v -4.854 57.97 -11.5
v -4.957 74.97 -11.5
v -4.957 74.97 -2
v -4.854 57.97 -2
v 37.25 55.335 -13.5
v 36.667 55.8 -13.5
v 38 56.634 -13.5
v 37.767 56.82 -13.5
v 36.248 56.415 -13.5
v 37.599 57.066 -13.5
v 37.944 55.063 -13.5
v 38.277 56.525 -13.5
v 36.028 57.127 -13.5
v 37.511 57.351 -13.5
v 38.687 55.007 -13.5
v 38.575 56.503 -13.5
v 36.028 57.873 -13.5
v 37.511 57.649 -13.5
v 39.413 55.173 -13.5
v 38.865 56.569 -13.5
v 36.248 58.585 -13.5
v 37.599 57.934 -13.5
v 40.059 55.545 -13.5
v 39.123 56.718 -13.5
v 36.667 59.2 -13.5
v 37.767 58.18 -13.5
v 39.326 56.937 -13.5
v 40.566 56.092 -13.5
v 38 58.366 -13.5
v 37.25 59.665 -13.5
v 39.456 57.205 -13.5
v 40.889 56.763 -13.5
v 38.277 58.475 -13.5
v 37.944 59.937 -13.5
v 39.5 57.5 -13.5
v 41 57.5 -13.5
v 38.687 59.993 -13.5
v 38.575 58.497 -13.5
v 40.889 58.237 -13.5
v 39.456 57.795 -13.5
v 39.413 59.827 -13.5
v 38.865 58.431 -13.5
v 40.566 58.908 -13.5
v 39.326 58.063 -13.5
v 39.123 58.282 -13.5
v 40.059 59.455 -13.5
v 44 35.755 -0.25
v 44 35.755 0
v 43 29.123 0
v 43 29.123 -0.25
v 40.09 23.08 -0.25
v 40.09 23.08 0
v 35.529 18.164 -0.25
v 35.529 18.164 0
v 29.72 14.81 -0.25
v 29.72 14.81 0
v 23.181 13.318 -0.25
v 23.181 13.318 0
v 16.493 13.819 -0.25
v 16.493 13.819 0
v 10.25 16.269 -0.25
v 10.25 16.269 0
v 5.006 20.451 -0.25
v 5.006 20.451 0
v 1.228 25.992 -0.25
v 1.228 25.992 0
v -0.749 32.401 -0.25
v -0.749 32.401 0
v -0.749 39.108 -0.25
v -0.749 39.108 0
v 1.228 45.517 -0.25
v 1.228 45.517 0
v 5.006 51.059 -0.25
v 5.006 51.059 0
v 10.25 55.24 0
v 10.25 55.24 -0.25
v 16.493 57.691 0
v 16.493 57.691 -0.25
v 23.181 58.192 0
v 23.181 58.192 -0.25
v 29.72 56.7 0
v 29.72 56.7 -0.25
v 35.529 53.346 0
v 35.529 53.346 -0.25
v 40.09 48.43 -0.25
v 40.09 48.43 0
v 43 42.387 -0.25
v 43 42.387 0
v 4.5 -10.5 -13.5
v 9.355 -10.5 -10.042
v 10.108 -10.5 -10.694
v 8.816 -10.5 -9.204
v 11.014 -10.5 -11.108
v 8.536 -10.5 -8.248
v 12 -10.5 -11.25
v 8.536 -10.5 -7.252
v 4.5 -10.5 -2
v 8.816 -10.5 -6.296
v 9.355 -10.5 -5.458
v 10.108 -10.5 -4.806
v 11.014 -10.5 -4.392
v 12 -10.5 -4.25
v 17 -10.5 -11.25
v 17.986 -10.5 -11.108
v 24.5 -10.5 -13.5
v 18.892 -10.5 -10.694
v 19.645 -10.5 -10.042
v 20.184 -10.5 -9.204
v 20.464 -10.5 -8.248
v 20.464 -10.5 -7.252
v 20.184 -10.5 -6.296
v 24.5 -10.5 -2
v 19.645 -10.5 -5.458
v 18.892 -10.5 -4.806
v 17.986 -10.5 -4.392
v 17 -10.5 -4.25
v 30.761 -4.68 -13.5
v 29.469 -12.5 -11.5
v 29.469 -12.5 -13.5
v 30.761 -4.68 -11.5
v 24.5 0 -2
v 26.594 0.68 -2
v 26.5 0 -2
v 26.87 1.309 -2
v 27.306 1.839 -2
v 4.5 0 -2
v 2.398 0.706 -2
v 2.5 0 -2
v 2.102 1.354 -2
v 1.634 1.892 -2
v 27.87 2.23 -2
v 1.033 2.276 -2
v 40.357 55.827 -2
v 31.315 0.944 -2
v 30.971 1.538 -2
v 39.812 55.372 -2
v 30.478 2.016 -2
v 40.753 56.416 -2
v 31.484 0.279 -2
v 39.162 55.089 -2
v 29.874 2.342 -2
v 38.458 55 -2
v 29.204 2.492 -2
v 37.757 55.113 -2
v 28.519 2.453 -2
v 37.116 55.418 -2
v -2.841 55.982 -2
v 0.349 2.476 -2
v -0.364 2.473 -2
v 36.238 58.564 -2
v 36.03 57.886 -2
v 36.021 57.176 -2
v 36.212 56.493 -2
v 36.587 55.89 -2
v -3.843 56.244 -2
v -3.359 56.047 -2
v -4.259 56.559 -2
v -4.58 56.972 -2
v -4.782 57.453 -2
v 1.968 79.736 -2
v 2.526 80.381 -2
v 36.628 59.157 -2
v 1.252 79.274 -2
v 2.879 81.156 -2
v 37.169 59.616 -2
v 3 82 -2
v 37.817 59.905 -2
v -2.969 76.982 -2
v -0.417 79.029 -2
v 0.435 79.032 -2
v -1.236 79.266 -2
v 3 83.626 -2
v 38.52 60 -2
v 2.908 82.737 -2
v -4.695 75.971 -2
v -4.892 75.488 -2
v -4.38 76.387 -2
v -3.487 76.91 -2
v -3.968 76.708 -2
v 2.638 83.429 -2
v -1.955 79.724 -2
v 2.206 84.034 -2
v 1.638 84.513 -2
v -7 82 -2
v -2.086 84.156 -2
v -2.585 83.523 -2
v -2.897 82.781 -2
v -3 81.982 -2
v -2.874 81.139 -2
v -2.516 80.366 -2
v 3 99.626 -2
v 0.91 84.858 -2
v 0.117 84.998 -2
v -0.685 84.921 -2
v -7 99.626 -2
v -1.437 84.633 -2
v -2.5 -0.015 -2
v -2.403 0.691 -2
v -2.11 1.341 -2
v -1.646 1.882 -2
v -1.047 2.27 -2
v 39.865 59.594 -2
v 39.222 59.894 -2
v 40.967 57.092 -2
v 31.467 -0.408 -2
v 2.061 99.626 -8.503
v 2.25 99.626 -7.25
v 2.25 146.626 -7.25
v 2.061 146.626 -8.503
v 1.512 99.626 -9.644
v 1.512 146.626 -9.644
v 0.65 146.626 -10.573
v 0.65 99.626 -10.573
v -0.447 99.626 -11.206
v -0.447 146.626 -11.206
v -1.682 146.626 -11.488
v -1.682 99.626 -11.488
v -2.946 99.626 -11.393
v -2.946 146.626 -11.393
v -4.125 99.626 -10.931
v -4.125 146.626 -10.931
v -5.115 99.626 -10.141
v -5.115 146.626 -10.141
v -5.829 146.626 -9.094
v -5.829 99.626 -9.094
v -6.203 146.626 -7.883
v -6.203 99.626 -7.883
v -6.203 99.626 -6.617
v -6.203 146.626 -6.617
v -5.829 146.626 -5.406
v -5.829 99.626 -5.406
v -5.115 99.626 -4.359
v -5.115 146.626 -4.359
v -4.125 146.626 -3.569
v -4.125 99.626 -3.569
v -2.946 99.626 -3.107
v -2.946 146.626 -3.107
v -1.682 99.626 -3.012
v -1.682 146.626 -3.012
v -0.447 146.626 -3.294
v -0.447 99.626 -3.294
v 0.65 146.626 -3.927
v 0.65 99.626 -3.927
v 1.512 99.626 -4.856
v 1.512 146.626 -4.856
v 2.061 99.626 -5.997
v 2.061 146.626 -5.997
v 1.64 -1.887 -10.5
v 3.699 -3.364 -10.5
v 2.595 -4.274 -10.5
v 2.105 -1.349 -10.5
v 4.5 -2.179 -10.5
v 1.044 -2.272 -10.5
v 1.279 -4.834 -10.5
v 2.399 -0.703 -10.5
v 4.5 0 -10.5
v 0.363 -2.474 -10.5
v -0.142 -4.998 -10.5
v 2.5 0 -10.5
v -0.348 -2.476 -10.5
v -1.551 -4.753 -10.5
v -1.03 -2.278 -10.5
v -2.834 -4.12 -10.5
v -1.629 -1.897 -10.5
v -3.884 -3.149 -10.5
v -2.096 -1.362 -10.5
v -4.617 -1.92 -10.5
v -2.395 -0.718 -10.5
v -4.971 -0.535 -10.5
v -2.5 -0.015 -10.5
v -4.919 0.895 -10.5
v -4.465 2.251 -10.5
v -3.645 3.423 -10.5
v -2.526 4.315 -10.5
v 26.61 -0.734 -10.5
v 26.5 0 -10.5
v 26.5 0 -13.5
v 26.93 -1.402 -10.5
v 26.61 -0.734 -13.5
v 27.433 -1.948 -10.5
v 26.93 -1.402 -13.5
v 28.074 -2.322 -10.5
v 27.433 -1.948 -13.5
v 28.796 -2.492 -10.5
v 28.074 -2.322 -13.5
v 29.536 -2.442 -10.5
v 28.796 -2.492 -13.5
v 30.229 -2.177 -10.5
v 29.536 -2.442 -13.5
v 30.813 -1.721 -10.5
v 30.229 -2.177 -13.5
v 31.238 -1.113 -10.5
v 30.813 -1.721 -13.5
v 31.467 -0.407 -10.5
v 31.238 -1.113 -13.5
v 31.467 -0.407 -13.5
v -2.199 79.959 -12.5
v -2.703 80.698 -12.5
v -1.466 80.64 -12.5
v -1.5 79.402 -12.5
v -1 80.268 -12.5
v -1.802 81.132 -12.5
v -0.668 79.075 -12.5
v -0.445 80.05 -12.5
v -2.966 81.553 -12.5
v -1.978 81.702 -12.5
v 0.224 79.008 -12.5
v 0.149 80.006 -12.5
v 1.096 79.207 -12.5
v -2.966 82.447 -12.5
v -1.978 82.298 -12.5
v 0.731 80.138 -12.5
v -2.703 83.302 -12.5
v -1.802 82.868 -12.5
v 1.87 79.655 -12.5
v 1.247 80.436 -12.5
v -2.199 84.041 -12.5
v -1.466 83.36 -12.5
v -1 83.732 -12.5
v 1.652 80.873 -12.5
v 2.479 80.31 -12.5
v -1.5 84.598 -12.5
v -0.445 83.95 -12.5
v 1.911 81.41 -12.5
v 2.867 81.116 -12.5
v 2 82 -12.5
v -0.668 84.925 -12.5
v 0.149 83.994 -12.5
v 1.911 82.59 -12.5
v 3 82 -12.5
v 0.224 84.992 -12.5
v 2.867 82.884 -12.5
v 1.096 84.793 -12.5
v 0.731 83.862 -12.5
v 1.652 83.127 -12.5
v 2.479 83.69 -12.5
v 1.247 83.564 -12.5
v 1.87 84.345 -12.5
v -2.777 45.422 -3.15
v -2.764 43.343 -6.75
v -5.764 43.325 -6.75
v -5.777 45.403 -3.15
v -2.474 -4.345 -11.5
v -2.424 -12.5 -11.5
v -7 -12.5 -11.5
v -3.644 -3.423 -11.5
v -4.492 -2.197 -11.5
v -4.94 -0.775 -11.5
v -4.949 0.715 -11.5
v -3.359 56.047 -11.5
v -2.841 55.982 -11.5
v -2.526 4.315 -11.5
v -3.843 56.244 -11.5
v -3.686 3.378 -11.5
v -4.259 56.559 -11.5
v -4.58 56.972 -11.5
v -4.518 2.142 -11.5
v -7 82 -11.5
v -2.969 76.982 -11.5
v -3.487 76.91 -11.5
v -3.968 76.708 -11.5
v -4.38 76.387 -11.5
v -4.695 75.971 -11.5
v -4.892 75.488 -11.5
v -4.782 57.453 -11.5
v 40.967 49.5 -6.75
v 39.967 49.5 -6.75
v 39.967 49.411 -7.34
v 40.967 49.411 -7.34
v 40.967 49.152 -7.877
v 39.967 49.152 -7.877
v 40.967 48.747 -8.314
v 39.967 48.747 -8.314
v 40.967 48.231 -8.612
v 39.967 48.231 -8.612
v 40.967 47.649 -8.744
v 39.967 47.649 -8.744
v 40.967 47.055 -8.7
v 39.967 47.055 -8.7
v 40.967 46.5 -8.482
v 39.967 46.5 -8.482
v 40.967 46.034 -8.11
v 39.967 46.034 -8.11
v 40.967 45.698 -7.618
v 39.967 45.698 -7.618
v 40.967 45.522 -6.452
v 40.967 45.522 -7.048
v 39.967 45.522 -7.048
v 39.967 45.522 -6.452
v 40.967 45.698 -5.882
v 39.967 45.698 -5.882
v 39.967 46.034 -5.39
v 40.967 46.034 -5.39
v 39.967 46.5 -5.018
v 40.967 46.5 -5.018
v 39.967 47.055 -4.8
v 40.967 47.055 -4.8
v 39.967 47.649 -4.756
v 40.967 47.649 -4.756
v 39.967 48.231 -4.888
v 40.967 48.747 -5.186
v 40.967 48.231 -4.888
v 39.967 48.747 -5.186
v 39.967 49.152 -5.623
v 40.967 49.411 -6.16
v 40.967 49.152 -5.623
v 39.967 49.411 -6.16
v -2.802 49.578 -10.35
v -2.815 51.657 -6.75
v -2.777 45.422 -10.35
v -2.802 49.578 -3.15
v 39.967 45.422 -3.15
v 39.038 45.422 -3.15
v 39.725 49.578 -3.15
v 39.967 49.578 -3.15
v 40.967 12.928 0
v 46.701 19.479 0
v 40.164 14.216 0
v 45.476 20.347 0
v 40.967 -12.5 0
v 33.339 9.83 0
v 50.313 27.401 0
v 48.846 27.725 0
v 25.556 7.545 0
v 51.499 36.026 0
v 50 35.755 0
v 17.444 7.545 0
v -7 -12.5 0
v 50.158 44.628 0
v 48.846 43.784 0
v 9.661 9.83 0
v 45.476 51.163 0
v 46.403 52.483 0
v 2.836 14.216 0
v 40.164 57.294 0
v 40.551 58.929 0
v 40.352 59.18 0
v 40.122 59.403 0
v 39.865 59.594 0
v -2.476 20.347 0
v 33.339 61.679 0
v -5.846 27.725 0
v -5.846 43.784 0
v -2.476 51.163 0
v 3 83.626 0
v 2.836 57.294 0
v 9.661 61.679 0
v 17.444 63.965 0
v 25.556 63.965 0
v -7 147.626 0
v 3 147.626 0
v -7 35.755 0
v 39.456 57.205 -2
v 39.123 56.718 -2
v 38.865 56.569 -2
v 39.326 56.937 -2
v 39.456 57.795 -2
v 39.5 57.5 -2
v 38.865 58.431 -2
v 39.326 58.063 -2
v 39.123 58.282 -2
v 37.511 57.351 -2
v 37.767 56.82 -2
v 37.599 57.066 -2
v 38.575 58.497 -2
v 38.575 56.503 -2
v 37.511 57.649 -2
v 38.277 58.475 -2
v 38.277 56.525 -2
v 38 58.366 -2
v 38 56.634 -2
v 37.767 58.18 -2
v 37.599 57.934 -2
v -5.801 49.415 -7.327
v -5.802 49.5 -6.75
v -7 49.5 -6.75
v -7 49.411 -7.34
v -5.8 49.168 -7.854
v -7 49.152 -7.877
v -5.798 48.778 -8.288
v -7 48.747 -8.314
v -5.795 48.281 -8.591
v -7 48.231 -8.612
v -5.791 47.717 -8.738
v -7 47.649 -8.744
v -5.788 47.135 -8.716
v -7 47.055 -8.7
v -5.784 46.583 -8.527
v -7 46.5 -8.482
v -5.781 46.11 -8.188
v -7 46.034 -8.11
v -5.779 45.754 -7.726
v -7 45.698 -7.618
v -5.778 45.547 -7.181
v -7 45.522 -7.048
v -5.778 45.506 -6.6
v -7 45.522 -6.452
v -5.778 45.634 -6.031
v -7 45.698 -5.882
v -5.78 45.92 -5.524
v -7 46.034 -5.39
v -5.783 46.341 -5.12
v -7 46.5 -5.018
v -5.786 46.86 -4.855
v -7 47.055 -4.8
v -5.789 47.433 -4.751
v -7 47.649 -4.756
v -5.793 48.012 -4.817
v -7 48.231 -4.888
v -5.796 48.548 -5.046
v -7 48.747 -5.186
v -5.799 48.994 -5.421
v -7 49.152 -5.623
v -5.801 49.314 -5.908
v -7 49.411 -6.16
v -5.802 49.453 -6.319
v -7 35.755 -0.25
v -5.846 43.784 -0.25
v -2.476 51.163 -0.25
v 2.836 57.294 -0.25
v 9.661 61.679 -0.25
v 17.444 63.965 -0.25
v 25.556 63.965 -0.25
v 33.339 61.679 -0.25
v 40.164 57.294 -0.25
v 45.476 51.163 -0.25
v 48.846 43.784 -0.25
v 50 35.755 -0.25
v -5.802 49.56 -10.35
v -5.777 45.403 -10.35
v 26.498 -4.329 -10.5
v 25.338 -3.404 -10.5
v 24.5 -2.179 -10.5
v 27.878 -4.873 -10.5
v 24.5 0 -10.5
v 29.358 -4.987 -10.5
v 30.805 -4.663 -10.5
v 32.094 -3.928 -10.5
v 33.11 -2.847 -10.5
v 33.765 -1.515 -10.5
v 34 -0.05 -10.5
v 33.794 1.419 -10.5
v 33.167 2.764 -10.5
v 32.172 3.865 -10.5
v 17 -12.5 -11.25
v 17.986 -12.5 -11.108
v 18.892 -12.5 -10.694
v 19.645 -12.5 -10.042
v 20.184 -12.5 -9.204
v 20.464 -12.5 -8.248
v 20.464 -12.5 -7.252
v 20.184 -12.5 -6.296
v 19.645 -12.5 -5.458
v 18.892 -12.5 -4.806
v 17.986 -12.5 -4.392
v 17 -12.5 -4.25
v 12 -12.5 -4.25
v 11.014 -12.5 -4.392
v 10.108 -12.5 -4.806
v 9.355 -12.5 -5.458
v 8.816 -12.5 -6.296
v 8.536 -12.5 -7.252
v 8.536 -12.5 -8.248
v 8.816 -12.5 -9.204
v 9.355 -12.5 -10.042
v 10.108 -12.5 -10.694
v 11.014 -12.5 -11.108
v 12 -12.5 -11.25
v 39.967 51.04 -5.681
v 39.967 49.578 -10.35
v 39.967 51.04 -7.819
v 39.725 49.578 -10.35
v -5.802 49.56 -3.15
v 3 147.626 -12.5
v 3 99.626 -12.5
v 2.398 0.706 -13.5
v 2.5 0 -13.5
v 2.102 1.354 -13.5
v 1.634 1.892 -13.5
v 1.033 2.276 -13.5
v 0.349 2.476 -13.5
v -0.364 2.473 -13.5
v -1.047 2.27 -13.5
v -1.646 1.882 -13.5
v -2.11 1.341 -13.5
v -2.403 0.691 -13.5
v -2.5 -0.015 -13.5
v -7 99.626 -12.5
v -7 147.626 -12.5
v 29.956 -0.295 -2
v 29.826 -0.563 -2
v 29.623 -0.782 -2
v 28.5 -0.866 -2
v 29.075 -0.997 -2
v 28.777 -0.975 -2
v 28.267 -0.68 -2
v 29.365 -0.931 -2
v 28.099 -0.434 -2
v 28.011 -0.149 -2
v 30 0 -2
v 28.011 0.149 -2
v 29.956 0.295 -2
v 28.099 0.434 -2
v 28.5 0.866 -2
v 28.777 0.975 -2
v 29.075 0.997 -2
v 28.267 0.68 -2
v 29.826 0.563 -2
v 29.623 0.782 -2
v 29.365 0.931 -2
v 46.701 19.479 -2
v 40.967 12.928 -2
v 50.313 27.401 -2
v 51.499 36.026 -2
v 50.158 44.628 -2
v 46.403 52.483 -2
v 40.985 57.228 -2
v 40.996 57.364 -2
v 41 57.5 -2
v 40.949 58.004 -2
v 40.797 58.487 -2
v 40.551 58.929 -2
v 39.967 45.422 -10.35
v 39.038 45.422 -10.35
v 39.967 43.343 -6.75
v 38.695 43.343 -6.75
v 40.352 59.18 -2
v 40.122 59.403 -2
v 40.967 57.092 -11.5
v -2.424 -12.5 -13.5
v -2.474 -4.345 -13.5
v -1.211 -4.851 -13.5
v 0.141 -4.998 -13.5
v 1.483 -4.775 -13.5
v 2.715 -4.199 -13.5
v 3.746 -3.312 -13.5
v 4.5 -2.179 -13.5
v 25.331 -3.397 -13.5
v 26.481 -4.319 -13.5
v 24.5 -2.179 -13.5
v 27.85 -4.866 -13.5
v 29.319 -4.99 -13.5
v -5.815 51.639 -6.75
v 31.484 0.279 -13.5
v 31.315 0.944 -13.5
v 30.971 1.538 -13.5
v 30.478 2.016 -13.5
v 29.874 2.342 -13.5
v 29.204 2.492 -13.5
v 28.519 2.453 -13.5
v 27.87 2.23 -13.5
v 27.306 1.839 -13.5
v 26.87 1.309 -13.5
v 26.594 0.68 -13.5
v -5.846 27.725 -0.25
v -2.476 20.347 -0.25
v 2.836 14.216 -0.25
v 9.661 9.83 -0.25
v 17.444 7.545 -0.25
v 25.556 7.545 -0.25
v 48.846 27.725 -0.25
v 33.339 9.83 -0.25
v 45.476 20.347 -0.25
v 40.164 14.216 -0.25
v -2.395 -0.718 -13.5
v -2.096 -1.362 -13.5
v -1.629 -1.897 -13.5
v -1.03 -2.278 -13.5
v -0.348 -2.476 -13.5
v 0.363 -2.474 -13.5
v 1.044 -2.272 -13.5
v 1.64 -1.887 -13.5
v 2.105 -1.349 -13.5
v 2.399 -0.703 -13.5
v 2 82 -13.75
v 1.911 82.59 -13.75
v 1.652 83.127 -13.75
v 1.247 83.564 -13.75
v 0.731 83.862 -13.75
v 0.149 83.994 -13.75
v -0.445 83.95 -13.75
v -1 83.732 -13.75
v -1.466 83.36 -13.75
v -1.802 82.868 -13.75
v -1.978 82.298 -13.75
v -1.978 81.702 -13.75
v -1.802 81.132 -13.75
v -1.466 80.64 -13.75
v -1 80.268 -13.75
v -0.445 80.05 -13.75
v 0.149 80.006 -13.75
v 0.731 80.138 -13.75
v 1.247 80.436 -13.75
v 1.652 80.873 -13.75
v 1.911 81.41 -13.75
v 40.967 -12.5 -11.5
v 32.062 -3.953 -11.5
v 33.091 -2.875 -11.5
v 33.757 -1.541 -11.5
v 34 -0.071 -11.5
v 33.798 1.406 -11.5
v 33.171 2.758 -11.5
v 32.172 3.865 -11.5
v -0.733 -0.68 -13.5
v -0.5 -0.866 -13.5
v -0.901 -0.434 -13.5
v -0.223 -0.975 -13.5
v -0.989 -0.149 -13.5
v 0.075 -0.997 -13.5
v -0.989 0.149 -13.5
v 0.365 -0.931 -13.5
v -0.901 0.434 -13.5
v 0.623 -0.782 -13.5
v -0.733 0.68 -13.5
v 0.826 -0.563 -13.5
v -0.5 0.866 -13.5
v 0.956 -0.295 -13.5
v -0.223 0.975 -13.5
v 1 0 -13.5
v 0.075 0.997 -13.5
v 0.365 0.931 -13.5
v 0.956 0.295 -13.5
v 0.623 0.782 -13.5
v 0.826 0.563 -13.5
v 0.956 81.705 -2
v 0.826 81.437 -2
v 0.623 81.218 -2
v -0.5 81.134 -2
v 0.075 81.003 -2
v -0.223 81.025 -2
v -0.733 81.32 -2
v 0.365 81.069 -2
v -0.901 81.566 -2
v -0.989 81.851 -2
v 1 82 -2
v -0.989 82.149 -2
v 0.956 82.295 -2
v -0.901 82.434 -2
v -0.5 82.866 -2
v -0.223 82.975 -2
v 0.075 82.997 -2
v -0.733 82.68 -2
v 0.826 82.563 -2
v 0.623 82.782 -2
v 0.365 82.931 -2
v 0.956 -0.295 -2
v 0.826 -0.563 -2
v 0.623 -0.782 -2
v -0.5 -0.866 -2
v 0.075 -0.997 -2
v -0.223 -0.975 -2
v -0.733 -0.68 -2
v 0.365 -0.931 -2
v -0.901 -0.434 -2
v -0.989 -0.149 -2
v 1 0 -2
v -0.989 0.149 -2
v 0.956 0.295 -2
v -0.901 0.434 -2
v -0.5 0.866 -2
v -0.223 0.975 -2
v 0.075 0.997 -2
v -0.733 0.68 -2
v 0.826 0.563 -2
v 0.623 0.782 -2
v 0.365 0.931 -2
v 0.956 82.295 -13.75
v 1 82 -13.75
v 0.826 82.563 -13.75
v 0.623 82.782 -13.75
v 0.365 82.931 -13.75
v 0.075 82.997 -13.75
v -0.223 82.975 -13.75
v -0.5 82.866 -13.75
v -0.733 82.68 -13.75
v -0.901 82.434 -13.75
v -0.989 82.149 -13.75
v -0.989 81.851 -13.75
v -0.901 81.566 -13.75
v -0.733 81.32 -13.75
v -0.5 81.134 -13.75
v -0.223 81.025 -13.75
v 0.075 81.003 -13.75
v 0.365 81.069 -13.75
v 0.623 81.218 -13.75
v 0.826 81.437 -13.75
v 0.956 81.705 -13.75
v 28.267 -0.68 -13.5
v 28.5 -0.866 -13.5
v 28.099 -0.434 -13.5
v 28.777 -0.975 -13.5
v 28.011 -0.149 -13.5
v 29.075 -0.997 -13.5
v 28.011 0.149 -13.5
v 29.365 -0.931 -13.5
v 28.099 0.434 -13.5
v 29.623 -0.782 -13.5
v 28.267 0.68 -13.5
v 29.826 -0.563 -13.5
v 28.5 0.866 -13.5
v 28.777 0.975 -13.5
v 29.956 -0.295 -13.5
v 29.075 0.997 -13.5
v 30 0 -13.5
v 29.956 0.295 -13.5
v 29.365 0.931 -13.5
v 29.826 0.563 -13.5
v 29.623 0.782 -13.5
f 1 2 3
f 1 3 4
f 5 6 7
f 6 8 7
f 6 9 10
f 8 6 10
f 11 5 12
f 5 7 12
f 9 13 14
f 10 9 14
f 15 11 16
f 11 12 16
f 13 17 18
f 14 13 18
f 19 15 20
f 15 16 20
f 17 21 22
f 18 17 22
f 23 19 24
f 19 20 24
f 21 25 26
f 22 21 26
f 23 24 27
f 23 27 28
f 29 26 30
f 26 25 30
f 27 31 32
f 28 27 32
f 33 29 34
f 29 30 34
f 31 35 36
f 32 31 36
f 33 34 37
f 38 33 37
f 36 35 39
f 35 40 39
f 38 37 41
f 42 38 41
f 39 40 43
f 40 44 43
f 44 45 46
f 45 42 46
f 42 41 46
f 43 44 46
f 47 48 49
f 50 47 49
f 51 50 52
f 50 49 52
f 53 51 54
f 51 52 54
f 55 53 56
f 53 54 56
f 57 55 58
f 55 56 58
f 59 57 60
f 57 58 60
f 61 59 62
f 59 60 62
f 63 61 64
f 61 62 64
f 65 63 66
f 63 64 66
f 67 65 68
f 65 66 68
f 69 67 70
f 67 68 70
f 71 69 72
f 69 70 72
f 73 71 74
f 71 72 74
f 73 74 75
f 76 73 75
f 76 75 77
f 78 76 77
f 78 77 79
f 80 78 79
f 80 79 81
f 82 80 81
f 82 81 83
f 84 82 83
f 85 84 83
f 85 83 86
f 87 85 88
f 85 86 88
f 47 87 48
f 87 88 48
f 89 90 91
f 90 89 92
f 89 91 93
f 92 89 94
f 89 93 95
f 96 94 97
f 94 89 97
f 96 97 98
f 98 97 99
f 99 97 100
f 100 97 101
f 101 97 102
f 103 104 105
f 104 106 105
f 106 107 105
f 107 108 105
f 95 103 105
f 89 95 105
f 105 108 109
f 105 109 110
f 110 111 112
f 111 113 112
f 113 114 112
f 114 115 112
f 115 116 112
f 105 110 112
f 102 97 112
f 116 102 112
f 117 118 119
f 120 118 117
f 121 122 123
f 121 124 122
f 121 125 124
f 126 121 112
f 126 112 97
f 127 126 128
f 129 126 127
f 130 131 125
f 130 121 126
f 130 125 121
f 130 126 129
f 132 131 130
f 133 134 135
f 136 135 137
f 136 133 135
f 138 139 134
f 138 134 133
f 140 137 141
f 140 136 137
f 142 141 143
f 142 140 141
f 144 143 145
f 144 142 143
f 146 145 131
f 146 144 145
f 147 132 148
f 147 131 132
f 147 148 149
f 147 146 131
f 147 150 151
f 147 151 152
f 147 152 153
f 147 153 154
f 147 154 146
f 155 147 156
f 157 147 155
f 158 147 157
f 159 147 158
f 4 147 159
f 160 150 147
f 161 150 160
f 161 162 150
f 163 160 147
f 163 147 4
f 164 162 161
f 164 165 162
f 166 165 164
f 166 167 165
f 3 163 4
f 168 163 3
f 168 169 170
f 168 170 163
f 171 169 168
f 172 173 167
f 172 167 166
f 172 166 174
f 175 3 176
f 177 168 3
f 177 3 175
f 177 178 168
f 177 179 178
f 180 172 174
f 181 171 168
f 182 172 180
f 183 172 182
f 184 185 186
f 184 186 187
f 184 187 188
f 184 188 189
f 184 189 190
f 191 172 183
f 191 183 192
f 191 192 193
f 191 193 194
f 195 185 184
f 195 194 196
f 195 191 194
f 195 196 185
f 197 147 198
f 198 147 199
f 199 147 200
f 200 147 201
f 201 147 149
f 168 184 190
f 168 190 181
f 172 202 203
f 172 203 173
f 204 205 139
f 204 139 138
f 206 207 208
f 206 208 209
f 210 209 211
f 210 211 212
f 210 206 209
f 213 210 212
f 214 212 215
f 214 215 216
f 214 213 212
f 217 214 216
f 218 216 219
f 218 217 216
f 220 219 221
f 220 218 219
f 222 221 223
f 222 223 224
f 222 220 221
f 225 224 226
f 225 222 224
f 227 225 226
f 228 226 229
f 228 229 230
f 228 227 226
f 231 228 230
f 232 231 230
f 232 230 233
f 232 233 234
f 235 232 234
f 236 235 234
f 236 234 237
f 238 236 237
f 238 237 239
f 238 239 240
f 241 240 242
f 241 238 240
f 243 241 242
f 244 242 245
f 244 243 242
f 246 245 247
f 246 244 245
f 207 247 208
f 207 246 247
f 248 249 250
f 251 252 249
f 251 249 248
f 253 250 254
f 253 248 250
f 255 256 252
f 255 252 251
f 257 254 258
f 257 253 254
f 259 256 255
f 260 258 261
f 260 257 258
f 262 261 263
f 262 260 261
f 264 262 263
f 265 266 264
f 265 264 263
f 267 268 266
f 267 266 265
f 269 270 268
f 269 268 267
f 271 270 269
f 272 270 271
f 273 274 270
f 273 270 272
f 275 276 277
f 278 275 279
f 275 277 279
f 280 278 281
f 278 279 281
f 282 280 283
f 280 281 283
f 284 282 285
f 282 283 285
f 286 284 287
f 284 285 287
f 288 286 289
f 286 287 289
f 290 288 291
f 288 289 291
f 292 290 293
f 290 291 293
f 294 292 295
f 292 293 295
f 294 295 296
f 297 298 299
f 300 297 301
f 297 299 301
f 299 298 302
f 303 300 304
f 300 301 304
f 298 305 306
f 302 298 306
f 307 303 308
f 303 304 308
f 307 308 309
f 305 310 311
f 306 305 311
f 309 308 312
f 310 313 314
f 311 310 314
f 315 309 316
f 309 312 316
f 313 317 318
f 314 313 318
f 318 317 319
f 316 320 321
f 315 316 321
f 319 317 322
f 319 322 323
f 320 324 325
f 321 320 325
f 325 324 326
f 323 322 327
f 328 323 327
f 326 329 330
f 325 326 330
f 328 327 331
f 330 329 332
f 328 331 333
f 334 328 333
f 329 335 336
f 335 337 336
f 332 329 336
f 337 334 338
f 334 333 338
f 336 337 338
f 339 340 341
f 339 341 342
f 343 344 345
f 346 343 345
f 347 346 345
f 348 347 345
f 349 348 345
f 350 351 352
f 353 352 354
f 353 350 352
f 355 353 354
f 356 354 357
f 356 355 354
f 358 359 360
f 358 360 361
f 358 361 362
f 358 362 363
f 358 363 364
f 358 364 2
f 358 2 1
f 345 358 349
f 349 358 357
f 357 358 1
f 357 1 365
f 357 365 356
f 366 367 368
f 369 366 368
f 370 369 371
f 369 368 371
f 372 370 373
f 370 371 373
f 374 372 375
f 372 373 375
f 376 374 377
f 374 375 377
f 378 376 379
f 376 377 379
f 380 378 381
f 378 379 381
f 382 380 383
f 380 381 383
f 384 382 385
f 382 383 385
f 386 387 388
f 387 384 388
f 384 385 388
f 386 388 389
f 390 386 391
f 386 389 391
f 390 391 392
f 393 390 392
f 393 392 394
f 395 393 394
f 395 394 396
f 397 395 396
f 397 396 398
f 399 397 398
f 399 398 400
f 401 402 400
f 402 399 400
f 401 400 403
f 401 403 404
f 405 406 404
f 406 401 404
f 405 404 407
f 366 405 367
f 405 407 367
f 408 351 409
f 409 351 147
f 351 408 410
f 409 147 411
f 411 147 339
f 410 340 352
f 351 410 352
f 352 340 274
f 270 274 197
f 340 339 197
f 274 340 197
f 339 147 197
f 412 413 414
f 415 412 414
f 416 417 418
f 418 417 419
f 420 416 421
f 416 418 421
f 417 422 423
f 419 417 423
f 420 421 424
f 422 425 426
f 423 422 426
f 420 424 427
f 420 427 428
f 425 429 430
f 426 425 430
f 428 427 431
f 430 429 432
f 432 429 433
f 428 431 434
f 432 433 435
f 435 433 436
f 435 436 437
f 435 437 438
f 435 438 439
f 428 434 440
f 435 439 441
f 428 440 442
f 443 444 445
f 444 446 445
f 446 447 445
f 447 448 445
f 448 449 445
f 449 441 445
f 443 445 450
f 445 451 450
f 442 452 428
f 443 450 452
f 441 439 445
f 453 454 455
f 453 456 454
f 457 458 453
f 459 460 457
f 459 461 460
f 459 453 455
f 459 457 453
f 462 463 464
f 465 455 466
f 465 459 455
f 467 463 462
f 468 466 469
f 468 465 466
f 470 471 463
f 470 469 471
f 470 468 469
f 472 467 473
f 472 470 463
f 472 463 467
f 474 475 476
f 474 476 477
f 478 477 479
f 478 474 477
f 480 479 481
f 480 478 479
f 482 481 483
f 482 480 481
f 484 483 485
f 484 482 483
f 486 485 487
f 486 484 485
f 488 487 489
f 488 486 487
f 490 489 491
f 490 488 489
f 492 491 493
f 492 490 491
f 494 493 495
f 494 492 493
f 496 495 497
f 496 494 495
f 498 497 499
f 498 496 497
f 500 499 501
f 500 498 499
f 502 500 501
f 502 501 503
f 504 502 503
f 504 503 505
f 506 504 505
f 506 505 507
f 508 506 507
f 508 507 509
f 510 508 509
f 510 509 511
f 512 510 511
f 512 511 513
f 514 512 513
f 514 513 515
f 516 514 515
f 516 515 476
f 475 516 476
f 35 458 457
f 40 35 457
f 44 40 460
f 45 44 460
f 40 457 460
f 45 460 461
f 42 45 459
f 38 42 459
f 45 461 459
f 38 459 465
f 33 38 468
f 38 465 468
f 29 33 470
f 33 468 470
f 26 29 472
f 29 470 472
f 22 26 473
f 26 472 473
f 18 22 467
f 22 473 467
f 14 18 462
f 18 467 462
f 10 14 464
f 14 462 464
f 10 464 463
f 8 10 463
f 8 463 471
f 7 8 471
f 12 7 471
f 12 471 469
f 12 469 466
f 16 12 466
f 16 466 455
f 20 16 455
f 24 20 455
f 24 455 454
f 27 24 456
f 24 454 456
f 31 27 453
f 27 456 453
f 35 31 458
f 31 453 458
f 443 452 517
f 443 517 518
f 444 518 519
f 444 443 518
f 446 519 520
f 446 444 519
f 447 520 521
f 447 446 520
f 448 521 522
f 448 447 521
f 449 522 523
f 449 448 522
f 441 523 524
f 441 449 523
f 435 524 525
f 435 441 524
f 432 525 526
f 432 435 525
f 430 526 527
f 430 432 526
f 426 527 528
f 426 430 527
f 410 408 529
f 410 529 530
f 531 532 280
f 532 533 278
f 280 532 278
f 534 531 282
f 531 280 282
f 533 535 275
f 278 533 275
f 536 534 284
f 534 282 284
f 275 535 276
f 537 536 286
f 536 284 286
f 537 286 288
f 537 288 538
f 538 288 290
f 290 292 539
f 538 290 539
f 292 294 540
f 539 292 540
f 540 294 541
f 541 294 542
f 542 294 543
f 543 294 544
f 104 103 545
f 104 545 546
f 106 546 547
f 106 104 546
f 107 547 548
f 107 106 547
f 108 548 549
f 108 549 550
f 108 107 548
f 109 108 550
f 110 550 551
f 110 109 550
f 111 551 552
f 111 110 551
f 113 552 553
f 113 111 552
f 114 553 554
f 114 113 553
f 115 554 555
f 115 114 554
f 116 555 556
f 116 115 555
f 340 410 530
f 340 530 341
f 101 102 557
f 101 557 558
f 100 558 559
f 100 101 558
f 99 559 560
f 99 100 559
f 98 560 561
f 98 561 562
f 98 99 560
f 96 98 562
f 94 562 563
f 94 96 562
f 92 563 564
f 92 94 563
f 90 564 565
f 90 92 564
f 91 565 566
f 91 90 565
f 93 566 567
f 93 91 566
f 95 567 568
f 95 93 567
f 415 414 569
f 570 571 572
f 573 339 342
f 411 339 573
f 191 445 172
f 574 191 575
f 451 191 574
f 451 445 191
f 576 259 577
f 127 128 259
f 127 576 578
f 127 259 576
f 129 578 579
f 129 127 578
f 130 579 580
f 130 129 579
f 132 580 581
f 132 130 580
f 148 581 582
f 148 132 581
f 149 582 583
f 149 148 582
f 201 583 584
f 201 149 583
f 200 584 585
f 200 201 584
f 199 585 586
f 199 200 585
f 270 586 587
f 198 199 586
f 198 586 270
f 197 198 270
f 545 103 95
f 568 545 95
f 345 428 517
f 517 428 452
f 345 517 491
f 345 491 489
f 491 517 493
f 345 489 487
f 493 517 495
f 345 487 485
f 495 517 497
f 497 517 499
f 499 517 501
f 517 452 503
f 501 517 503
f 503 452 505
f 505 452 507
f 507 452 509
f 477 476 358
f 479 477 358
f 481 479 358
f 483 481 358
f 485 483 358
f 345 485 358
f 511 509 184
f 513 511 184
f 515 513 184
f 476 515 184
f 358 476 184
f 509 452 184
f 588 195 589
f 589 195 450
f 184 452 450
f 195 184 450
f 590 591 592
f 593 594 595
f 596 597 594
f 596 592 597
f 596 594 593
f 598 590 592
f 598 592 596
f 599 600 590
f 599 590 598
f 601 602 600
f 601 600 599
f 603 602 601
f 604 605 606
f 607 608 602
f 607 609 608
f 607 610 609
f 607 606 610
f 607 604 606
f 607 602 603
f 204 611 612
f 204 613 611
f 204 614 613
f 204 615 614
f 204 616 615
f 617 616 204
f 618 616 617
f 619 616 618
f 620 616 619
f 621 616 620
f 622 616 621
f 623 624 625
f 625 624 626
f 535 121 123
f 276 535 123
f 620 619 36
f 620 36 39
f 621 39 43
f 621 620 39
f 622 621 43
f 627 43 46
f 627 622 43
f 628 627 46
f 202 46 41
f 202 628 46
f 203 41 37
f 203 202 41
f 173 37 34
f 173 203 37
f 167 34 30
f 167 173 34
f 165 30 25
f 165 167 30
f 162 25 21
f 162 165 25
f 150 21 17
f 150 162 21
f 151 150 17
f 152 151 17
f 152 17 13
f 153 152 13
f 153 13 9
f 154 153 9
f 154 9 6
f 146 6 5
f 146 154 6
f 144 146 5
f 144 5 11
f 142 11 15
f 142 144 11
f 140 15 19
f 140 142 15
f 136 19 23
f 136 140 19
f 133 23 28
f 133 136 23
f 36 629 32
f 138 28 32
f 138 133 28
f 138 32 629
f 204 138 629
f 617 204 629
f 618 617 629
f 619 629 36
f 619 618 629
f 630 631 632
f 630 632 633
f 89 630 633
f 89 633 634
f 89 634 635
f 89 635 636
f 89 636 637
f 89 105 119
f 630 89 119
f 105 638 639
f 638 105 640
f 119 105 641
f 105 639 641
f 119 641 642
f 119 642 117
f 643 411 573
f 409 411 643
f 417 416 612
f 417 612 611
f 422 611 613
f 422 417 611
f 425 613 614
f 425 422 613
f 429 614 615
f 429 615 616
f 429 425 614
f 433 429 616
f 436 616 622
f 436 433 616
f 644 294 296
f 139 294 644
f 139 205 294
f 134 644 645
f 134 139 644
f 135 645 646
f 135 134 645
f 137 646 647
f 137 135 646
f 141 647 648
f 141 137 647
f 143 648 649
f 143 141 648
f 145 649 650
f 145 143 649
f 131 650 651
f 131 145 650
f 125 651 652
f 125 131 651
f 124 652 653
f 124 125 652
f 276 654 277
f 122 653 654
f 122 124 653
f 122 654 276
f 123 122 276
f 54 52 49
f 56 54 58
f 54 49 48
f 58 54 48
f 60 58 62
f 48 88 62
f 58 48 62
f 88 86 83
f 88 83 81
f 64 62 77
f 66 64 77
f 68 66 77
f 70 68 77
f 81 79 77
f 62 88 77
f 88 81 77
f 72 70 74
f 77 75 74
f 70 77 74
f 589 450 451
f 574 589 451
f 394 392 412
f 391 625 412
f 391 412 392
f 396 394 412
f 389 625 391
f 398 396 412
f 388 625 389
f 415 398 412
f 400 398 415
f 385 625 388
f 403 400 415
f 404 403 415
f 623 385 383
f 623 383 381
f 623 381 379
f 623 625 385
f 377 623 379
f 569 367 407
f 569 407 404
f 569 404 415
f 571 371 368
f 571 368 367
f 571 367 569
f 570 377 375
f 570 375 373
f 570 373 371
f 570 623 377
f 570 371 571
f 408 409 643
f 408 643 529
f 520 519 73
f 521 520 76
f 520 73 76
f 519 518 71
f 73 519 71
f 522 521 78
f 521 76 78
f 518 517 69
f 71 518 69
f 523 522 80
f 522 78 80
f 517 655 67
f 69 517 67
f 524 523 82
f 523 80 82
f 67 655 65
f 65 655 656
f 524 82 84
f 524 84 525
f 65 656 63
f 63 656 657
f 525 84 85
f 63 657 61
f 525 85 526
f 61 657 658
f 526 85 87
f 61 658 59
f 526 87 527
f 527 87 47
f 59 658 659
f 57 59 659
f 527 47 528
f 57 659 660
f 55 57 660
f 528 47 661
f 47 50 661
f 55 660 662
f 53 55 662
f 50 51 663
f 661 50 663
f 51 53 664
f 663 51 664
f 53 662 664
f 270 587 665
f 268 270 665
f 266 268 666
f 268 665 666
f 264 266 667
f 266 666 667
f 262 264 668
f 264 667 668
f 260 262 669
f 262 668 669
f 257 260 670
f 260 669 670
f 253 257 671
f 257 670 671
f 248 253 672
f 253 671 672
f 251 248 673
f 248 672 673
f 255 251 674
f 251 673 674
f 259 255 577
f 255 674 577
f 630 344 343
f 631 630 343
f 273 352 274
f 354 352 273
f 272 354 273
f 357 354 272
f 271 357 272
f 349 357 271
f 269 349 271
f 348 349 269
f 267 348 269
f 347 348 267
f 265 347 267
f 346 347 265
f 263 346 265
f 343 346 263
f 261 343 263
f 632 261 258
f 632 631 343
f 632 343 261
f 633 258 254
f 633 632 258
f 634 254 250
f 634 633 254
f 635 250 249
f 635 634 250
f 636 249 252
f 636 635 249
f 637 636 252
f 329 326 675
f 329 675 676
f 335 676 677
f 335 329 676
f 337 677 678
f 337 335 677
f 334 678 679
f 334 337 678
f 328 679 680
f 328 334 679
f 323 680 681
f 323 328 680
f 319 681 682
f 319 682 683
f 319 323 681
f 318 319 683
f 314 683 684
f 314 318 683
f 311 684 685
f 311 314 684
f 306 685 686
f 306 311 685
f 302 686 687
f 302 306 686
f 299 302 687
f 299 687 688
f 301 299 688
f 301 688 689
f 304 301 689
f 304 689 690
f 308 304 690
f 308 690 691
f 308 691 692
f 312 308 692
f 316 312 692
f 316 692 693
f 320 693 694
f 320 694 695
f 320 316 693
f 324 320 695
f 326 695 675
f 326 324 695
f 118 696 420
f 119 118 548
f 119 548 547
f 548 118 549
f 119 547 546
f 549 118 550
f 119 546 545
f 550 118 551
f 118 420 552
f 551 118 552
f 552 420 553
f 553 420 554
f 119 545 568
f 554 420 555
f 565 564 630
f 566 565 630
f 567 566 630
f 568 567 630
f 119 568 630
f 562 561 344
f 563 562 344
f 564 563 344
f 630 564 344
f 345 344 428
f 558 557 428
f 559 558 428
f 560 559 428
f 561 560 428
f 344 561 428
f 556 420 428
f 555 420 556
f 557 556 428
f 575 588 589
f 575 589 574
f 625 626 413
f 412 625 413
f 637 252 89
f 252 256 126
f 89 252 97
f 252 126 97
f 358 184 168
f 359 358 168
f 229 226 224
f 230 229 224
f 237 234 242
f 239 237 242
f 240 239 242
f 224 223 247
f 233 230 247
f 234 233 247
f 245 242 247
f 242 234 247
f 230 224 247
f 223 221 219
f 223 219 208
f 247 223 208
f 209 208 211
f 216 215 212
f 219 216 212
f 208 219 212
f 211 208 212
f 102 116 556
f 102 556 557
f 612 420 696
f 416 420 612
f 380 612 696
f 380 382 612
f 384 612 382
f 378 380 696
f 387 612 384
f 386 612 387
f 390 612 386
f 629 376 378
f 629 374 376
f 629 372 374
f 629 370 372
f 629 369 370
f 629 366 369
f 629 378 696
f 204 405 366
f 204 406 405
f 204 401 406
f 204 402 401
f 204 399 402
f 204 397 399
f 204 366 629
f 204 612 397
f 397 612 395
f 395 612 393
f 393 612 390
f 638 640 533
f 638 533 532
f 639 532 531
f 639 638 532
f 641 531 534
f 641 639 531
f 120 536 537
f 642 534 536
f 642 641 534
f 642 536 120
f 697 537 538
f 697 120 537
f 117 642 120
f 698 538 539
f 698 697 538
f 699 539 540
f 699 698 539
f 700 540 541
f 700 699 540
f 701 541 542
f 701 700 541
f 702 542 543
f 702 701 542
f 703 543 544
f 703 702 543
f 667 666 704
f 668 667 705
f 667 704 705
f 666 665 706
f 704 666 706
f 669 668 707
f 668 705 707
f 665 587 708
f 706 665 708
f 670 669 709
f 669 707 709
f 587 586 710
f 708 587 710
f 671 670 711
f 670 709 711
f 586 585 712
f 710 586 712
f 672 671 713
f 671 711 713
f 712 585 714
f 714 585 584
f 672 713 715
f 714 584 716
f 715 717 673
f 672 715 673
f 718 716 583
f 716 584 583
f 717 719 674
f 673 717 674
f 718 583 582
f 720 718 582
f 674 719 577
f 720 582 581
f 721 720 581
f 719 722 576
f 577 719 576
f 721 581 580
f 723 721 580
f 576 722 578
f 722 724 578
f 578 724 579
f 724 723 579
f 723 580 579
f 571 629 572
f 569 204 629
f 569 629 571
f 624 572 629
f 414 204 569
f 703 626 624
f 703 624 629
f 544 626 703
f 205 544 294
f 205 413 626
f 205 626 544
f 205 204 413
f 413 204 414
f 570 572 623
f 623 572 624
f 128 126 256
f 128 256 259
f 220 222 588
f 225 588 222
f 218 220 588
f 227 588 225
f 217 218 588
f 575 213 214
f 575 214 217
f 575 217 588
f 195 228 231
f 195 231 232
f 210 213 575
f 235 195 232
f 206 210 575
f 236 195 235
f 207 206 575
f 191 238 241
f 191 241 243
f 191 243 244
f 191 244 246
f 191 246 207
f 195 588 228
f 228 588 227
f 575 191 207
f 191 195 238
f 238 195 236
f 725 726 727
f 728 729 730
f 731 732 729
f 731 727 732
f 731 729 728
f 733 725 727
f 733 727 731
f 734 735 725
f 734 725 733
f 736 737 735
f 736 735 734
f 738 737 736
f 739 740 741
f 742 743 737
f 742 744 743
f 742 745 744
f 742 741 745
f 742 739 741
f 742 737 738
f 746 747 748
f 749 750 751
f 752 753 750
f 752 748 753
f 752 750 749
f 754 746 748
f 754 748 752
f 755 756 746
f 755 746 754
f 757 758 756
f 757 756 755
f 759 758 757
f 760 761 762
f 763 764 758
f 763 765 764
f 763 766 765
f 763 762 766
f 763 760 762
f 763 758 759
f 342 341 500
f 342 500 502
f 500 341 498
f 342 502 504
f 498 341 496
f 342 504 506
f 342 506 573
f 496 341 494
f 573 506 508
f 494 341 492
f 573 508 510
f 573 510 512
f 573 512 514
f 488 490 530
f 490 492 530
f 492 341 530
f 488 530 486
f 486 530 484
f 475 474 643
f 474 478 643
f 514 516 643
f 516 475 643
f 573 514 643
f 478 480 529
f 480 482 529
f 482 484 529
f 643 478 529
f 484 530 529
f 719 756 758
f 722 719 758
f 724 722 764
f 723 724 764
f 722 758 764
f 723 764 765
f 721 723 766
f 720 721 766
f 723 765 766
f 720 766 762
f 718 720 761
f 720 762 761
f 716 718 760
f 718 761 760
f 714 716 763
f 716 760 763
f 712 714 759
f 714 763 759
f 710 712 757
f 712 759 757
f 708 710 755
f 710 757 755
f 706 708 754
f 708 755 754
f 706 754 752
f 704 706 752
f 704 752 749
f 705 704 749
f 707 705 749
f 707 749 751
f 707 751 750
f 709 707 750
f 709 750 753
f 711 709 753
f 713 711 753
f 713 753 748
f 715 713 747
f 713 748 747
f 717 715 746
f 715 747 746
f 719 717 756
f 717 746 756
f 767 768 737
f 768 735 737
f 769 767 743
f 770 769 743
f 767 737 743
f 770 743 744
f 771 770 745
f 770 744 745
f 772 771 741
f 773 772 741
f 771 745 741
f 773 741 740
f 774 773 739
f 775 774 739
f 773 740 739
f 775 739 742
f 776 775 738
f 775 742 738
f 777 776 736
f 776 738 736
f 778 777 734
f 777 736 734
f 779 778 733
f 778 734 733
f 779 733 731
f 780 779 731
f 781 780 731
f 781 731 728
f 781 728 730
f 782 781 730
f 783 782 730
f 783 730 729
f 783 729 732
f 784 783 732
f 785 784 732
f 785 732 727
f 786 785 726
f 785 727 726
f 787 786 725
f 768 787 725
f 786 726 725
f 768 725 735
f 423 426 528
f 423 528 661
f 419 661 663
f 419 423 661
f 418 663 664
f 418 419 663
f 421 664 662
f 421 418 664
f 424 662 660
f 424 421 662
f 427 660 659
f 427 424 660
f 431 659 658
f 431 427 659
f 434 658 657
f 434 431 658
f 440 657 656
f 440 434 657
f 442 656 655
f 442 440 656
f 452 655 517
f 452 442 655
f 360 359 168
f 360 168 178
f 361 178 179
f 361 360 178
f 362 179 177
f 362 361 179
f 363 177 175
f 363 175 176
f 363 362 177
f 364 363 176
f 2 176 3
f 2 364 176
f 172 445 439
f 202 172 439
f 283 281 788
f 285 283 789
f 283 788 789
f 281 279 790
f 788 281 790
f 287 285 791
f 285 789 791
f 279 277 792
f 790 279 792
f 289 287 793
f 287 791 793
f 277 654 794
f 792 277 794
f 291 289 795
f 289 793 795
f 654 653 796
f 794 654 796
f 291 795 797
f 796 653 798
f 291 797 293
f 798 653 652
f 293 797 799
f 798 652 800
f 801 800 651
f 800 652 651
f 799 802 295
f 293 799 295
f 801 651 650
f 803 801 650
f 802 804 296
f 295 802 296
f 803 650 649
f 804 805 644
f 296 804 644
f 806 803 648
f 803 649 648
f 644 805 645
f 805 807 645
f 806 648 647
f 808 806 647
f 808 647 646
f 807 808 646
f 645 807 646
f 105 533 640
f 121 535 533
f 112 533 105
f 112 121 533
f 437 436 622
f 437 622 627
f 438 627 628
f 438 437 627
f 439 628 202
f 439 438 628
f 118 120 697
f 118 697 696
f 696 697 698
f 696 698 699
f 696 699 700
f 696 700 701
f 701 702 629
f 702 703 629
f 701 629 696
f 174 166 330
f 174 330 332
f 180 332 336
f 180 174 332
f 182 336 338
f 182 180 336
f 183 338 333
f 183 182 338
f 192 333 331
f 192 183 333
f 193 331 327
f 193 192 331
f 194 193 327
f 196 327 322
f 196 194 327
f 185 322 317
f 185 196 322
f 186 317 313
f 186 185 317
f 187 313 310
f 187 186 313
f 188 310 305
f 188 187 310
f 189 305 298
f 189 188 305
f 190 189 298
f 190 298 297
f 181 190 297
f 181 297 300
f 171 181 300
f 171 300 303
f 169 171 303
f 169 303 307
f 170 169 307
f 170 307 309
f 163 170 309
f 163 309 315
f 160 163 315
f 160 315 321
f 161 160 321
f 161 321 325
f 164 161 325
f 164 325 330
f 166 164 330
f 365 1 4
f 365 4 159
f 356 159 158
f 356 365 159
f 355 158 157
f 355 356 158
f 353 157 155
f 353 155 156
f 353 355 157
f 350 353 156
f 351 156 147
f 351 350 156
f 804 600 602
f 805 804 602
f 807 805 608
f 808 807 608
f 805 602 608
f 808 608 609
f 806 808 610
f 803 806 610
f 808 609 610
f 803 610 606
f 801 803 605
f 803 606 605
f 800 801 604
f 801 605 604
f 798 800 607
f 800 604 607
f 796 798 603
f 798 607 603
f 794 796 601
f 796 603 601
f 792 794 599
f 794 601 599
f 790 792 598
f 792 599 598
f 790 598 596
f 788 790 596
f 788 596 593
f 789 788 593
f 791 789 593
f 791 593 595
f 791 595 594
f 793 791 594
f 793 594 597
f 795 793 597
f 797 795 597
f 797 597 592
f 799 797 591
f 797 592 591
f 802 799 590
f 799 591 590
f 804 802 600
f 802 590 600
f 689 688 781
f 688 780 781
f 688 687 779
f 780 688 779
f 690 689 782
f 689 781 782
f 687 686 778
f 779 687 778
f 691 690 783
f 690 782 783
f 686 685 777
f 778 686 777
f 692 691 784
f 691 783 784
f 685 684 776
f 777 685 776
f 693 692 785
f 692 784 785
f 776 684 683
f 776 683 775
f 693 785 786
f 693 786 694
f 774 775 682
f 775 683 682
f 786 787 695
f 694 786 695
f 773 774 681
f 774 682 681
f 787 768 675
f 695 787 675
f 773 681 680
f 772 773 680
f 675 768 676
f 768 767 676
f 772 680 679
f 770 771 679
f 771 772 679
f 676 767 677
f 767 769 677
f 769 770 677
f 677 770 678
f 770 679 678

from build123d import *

# Parameters (mm, degrees)
PAD_DEPTH            = 2
SKETCH001_R          = 2.5
SKETCH001_R_2        = 1
PAD003_DEPTH         = 11.5
SKETCH003_R          = 3
SKETCH003_R_2        = 1
PAD004_DEPTH         = 10.5
SKETCH006_R          = 2
SKETCH006_R_2        = 1
PAD007_DEPTH         = 1.25
PAD010_DEPTH         = 2
SKETCH008_W          = 10
SKETCH008_H          = 48
PAD009_DEPTH         = 10.5
SKETCH009_R          = 4.25
POCKET_DEPTH         = 47
PAD011_DEPTH         = 11.5
POCKET001_DEPTH      = 2
PAD012_DEPTH         = 11.5
POCKET002_DEPTH      = 2
SKETCH017_R          = 2
POCKET003_DEPTH      = 100
POCKET003_DEPTH_BACK = 100
POCKET004_DEPTH      = 3
POCKET005_DEPTH      = 3
POCKET006_DEPTH      = 9.5
PAD013_DEPTH         = 2
SKETCH023_R          = 28.5
SKETCH023_R_2        = 22.5
POCKET007_DEPTH      = 0.25


with BuildPart() as body:
    # Sketch → Pad (new body)
    with BuildSketch(Plane.XY):
        with BuildLine():
            Line((1.6382610688, 84.5131853633), (39.8652231068, 59.5943175186))
            ThreePointArc((40.9665622412, 57.0924822575), (40.788108314, 58.5072538624), (39.8652231068, 59.5943175186))
            Line((31.4665652521, -0.4074995185), (40.9665622412, 57.0924822575))
            Line((31.4665652521, -0.4074995185), (29.4686738682, -12.5))
            Line((-2.4238255474, -12.5), (29.4686738682, -12.5))
            Line((-2.999944227, 81.9817069741), (-2.4238255474, -12.5))
            ThreePointArc((1.6382610688, 84.5131853633), (-1.4372337891, 84.6333171164), (-2.999944227, 81.9817069741))
        make_face()
    extrude(amount=PAD_DEPTH)

    # Sketch001 (on Face9 of Pad) → Pad003 (join)
    with BuildSketch(Plane.XY.offset(2)):
        Circle(SKETCH001_R)
        Circle(SKETCH001_R_2, mode=Mode.SUBTRACT)
        with Locations((29, 0)):
            Circle(SKETCH001_R)
        with Locations((29, 0)):
            Circle(SKETCH001_R_2, mode=Mode.SUBTRACT)
        with Locations((38.5, 57.5)):
            Circle(SKETCH001_R)
        with Locations((38.5, 57.5)):
            Circle(SKETCH001_R_2, mode=Mode.SUBTRACT)
    extrude(amount=PAD003_DEPTH)

    # Sketch003 (on Face5 of Pad003) → Pad004 (join)
    with BuildSketch(Plane.XY.offset(2)):
        with Locations((0, 82)):
            Circle(SKETCH003_R)
        with Locations((0, 82)):
            Circle(SKETCH003_R_2, mode=Mode.SUBTRACT)
    extrude(amount=PAD004_DEPTH)

    # Sketch006 (on Face11 of Pad004) → Pad007 (join)
    with BuildSketch(Plane.XY.offset(12.5)):
        with Locations((0, 82)):
            Circle(SKETCH006_R)
        with Locations((0, 82)):
            Circle(SKETCH006_R_2, mode=Mode.SUBTRACT)
    extrude(amount=PAD007_DEPTH)

    # Sketch011 → Pad010 (join)
    with BuildSketch(Plane.XY):
        with BuildLine():
            Line((-7, 147.625513661), (3, 147.625513661))
            Line((3, 147.625513661), (3, 83.625513661))
            Line((1.6382610688, 84.5131853633), (3, 83.625513661))
            ThreePointArc((1.6382610688, 84.5131853633), (-1.4372359533, 84.6333159352), (-2.9999441969, 81.9817020431))
            Line((-2.9999441969, 81.9817020431), (-2.9694558253, 76.9817020431))
            Line((-7, 82), (-2.9694558253, 76.9817020431))
            Line((-7, 147.625513661), (-7, 82))
        make_face()
    extrude(amount=PAD010_DEPTH)

    # Sketch008 (on Face13 of Pad010) → Pad009 (join)
    with BuildSketch(Plane.XY.offset(2)):
        with Locations((-2, 123.625513661)):
            Rectangle(SKETCH008_W, SKETCH008_H)
    extrude(amount=PAD009_DEPTH)

    # Sketch009 (on Face22 of Pad009) → Pocket (cut)
    with BuildSketch(Plane.XZ.offset(-99.625513661)):
        with Locations((-2, 7.25)):
            Circle(SKETCH009_R)
    extrude(amount=-POCKET_DEPTH, mode=Mode.SUBTRACT)

    # Sketch012 (on Face4 of Pocket) → Pad011 (join)
    with BuildSketch(Plane.XY.offset(2)):
        with BuildLine():
            Line((4.5, 0), (2.5, 0))
            ThreePointArc((-2.4999535249, -0.0152438001), (0.0076219355, -2.4999883812), (2.5, 0))
            Line((-2.4238255474, -12.5), (-2.4999535249, -0.0152438001))
            Line((-2.4238255474, -12.5), (29.4686738682, -12.5))
            Line((29.4686738682, -12.5), (31.4665652521, -0.4074995185))
            ThreePointArc((26.4999999999, 0), (28.7955655729, -2.4916272926), (31.4665652521, -0.4074995185))
            Line((24.5, 0), (26.4999999999, 0))
            Line((24.5, 0), (24.5, -10.5))
            Line((4.5, -10.5), (24.5, -10.5))
            Line((4.5, 0), (4.5, -10.5))
        make_face()
    extrude(amount=PAD011_DEPTH)

    # Sketch013 (on Face16 of Pad011) → Pocket001 (cut)
    with BuildSketch(Plane(origin=(0, -10.5, 0), x_dir=(-1, 0, 0), z_dir=(0, 1, 0))):
        with BuildLine():
            ThreePointArc((-17, 11.25), (-20.5, 7.75), (-17, 4.25))
            Line((-17, 4.25), (-12, 4.25))
            ThreePointArc((-12, 4.25), (-8.5, 7.75), (-12, 11.25))
            Line((-17, 11.25), (-12, 11.25))
        make_face()
    extrude(amount=-POCKET001_DEPTH, mode=Mode.SUBTRACT)

    # Sketch014 → Pad012 (join)
    with BuildSketch(Plane.XY):
        Polygon((-7, 82), (-2.9694558253, 76.9817020431), (-2.4238255474, -12.5), (-7, -12.5), align=None)
        Polygon((40.9665622412, 57.0924822575), (29.4686738682, -12.5), (40.9665622412, -12.5), align=None)
    extrude(amount=PAD012_DEPTH)

    # Sketch016 (on DatumPlane) → Pocket002 (cut)
    with BuildSketch(Plane.YZ.offset(37.9665622412)):
        Polygon((51.6569219382, 6.75), (49.5784609691, 10.35), (45.4215390309, 10.35), (43.3430780618, 6.75), (45.4215390309, 3.15), (49.5784609691, 3.15), align=None)
    extrude(amount=POCKET002_DEPTH, mode=Mode.SUBTRACT)

    # Sketch017 (on DatumPlane) → Pocket003 (cut, two sides)
    with BuildSketch(Plane.YZ.offset(37.9665622412)) as pocket003_sk:
        with Locations((47.5, 6.75)):
            Circle(SKETCH017_R)
    extrude(amount=-POCKET003_DEPTH, mode=Mode.SUBTRACT)
    extrude(pocket003_sk.sketch, amount=POCKET003_DEPTH_BACK, mode=Mode.SUBTRACT)

    # Sketch018 (on Face13 of Pocket003) → Pocket004 (cut)
    with BuildSketch(Plane(origin=(-2.4999535243, -0.0152439024, 0), x_dir=(-0.006097561, 0.9999814097, 0), z_dir=(0.9999814097, 0.006097561, 0))):
        Polygon((51.6730491796, 6.75), (49.5945882105, 10.35), (45.4376662723, 10.35), (43.3592053032, 6.75), (45.4376662723, 3.15), (49.5945882105, 3.15), align=None)
    extrude(amount=-POCKET004_DEPTH, mode=Mode.SUBTRACT)

    # Sketch019 (on Face45 of Pocket004) → Pocket005 (cut)
    with BuildSketch(Plane.XY.offset(13.5)):
        with BuildLine():
            ThreePointArc((-2.4999535248, -0.0152438096), (0.0076219402, -2.4999883812), (2.5, 0))
            Line((2.5, 0), (4.5, 0))
            Line((4.5, 0), (4.5, -2.1794494718))
            ThreePointArc((-2.5263567378, 4.3148026181), (-3.3937655316, -3.671832719), (4.5, -2.1794494718))
            Line((-2.5263567378, 4.3148026181), (-2.4999535248, -0.0152438096))
        make_face()
        with BuildLine():
            ThreePointArc((24.5, -2.1794494718), (32.0941134062, -3.9276535272), (32.172405562, 3.8646918312))
            Line((31.4665660971, -0.4074944038), (32.172405562, 3.8646918312))
            ThreePointArc((26.4999999999, 0), (28.7955681562, -2.4916275046), (31.4665660971, -0.4074944038))
            Line((24.5, 0), (26.4999999999, 0))
            Line((24.5, -2.1794494718), (24.5, 0))
        make_face()
    extrude(amount=-POCKET005_DEPTH, mode=Mode.SUBTRACT)

    # Sketch021 (on Face38 of Pocket005) → Pocket006 (cut)
    with BuildSketch(Plane.XY.offset(11.5)):
        with BuildLine():
            ThreePointArc((-2.9694558253, 76.9817020431), (-4.3800712285, 76.387303242), (-4.9572235227, 74.9695441018))
            Line((-4.9572235227, 74.9695441018), (-4.8535649862, 57.9698601368))
            ThreePointArc((-4.8535649862, 57.9698601368), (-4.259166185, 56.5592447336), (-2.8414070448, 55.9820924394))
            Line((-2.8414070448, 55.9820924394), (-2.9694558253, 76.9817020431))
        make_face()
    extrude(amount=-POCKET006_DEPTH, mode=Mode.SUBTRACT)

    # Sketch022 → Pad013 (join)
    with BuildSketch(Plane.XY):
        with BuildLine():
            Line((40.9665622412, 12.9282777021), (40.9665622412, 57.0924822575))
            ThreePointArc((40.9665622412, 57.0924822575), (40.9384086484, 58.0515099848), (40.5511157715, 58.9293089561))
            ThreePointArc((40.9665622412, 12.9282777021), (51.4987766247, 36.0257883104), (40.5511157715, 58.9293089561))
        make_face()
    extrude(amount=PAD013_DEPTH)

    # Sketch023 (on Face7 of Pad013) → Pocket007 (cut)
    with BuildSketch(Plane(origin=(0, 0, 0), x_dir=(1, 0, 0), z_dir=(0, 0, -1))):
        with Locations((21.5, -35.7548620833)):
            Circle(SKETCH023_R)
        with Locations((21.5, -35.7548620833)):
            Circle(SKETCH023_R_2, mode=Mode.SUBTRACT)
    extrude(amount=-POCKET007_DEPTH, mode=Mode.SUBTRACT)


with BuildPart() as part_mirroring:
    # Part__Mirroring: instance of Body
    add(body.part.mirror(Plane(origin=(0, 0, 0), x_dir=(0, 1, 0), z_dir=(0, 0, 1))))


solid = part_mirroring.part
